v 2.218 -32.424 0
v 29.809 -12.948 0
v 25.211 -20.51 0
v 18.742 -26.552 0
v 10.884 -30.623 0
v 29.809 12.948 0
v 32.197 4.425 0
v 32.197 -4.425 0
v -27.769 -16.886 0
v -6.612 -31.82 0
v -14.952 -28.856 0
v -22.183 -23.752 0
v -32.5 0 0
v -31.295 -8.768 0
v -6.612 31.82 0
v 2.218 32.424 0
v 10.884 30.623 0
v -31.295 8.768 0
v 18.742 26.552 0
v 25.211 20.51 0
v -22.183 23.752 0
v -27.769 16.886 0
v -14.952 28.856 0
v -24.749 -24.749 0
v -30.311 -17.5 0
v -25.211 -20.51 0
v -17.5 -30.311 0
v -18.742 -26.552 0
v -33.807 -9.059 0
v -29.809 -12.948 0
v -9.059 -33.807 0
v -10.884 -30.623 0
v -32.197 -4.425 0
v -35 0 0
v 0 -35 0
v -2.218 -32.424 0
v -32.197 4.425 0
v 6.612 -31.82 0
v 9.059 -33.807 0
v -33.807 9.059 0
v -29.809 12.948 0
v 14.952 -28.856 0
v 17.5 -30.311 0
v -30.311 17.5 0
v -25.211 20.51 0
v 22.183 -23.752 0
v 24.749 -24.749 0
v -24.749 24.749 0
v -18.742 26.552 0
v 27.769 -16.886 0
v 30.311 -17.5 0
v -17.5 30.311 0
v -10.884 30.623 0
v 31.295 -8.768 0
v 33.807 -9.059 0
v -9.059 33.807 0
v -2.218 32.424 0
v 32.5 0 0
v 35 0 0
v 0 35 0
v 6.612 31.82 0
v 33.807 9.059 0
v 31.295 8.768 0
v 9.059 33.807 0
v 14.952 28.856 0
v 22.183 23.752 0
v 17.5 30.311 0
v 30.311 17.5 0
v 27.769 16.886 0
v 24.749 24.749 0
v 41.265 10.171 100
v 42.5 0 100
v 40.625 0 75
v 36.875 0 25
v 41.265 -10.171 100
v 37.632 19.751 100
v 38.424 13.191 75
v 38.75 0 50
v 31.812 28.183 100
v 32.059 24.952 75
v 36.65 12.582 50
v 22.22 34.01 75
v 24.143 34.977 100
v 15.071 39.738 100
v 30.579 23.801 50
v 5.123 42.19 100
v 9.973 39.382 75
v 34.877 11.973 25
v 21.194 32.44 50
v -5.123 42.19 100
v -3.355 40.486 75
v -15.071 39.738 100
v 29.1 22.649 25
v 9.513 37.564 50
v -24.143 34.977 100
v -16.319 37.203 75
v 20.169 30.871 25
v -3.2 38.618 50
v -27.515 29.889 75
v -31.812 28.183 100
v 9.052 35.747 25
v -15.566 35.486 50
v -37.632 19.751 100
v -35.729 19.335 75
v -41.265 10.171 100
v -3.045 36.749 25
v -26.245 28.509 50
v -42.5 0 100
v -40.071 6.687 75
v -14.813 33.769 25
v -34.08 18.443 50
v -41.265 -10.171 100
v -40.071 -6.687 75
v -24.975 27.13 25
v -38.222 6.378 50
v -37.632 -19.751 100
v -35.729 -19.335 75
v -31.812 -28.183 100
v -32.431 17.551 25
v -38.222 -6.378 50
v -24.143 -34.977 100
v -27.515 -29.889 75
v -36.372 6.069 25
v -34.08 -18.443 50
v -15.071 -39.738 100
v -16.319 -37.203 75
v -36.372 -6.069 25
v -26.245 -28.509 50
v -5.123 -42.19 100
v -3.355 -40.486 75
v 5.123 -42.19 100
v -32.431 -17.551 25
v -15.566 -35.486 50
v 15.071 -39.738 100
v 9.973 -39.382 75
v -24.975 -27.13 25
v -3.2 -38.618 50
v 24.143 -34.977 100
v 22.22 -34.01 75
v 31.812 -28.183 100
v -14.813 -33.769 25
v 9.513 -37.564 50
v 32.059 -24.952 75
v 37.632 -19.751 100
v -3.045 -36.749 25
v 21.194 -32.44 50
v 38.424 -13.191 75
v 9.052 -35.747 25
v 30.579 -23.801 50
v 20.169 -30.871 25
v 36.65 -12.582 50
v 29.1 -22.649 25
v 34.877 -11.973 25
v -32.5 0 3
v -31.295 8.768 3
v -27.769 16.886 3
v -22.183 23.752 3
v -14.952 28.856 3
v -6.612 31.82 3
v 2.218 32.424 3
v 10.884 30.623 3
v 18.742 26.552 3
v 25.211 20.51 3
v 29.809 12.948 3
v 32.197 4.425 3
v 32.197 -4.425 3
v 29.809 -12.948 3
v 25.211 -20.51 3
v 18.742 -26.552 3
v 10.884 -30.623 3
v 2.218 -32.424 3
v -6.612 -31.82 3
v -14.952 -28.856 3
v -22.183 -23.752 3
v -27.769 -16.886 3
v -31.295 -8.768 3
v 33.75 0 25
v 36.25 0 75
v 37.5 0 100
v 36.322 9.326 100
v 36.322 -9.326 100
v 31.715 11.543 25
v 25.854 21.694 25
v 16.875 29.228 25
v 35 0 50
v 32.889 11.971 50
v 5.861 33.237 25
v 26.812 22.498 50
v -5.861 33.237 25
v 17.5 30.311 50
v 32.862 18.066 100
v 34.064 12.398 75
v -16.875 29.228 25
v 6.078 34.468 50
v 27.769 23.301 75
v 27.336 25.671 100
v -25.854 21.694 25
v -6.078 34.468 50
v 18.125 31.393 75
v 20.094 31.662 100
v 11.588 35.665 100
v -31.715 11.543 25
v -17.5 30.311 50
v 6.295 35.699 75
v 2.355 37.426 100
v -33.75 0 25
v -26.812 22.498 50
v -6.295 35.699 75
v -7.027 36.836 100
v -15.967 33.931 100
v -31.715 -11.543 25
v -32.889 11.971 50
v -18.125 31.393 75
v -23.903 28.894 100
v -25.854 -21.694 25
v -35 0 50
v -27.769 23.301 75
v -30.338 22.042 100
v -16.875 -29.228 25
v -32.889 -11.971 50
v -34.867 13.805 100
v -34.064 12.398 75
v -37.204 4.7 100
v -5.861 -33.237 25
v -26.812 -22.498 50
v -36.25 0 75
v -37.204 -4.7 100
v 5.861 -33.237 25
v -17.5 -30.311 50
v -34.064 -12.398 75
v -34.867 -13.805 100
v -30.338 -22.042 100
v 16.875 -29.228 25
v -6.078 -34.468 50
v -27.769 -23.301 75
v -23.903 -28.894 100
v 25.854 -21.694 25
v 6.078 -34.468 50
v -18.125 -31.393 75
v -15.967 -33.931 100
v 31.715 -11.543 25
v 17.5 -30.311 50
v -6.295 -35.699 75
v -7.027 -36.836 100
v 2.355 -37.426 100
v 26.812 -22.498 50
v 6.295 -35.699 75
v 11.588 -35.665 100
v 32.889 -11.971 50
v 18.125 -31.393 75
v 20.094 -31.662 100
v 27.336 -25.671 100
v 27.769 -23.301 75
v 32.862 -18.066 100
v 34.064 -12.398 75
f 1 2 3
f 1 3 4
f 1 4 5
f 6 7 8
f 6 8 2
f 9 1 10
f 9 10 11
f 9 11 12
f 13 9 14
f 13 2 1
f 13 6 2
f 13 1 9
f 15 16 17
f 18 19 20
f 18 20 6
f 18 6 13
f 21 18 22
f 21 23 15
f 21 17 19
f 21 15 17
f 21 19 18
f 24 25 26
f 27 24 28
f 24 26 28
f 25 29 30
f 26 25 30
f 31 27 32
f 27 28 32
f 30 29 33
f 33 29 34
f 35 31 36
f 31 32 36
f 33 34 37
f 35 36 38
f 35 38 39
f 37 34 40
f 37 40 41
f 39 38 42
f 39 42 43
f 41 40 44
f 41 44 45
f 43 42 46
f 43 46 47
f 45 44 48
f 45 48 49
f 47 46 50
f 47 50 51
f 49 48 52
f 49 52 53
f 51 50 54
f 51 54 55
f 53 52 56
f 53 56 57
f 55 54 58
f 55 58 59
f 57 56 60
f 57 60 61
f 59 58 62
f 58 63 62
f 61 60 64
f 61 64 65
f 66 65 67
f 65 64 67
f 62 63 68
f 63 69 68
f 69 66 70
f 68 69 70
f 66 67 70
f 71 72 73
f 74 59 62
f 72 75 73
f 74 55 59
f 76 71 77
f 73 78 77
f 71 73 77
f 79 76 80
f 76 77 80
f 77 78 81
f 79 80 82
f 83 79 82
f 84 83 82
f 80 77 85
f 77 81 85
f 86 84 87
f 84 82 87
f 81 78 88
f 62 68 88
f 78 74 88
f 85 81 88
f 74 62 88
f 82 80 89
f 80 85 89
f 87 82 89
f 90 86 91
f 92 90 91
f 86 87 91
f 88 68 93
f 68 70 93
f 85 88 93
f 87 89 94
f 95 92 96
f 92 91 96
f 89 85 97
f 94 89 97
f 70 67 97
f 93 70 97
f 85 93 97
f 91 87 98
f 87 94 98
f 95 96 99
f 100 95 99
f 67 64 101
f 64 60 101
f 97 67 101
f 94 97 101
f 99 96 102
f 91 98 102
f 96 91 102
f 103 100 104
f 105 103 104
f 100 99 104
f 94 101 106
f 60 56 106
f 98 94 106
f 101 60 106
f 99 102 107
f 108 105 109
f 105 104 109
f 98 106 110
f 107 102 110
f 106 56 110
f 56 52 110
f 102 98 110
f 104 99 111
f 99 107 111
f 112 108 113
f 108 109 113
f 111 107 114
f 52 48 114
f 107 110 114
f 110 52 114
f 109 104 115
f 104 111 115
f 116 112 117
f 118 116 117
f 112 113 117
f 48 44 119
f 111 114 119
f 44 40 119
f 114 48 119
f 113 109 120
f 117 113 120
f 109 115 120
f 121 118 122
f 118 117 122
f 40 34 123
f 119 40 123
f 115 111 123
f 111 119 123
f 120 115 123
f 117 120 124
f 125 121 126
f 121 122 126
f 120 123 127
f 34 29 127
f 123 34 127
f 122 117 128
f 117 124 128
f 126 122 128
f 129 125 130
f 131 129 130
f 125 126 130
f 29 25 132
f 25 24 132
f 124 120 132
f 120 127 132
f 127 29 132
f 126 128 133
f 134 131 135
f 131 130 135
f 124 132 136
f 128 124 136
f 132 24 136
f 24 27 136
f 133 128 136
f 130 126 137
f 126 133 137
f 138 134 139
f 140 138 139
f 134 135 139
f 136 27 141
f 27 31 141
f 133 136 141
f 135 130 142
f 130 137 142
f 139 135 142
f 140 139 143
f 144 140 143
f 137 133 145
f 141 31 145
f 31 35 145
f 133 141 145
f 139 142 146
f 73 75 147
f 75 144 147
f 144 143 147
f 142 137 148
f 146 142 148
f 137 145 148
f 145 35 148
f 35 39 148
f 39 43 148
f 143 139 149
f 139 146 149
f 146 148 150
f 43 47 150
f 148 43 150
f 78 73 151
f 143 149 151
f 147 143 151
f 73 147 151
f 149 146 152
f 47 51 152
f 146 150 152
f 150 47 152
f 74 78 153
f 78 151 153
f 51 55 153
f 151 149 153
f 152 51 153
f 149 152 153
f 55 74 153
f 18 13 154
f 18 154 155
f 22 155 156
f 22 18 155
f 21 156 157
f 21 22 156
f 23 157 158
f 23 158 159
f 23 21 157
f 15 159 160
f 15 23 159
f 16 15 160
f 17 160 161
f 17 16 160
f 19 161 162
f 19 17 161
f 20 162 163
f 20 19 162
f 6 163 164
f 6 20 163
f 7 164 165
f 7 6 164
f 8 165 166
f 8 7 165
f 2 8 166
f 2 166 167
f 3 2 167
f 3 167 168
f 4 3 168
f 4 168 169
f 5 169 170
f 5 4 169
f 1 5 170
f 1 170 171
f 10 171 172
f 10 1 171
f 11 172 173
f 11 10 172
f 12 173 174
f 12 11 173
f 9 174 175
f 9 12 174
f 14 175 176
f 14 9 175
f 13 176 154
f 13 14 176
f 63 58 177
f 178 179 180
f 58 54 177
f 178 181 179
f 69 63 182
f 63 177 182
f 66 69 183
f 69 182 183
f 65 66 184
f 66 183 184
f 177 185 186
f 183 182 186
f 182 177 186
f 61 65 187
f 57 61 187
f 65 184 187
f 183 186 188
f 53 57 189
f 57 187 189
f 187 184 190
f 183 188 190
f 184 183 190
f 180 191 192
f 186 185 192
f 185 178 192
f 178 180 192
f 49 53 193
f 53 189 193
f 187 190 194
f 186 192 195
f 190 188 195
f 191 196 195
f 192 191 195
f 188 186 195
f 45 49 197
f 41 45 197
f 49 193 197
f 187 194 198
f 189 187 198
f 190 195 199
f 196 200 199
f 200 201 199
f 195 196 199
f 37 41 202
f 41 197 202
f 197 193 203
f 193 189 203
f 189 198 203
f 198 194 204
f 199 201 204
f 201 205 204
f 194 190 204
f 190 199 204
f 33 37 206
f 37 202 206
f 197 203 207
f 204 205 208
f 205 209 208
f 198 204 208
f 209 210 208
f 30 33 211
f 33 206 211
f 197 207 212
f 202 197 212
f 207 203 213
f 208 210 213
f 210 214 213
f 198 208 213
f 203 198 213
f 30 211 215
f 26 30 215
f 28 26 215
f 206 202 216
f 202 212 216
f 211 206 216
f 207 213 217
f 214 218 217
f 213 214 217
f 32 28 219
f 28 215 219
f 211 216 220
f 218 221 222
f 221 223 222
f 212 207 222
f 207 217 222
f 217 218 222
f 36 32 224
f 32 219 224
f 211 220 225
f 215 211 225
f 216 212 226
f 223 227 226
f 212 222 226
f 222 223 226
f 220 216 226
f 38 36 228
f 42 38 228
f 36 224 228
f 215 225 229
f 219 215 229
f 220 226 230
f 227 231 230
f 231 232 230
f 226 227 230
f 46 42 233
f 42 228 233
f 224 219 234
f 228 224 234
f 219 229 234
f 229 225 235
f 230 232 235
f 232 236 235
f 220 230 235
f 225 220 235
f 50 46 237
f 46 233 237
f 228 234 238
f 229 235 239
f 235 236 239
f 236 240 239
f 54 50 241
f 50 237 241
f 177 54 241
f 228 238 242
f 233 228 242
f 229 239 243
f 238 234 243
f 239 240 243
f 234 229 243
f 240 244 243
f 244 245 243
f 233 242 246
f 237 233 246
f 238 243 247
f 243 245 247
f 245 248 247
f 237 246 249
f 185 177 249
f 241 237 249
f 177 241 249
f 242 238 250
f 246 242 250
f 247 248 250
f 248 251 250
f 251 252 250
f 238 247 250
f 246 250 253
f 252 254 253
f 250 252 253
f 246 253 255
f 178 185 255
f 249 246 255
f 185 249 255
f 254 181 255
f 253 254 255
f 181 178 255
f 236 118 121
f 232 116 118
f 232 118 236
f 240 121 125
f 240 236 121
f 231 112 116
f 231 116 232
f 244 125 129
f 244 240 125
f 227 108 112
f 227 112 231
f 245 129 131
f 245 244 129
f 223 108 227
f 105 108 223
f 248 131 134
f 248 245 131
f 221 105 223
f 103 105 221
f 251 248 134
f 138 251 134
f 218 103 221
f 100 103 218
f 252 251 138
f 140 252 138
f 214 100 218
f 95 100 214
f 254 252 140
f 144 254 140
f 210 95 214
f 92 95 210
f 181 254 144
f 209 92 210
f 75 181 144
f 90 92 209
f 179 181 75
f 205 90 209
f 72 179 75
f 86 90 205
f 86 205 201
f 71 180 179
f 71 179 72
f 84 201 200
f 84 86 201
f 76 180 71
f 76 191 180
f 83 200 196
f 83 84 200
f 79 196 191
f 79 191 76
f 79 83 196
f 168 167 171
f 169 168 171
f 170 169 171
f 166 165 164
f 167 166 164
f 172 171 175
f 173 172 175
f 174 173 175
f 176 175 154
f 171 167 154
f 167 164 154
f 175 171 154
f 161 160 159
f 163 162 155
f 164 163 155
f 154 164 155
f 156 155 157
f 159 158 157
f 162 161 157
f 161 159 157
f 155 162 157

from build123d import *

# Parameters (mm, degrees)
SKETCH7_R           = 42.5
SKETCH6_R           = 35
SKETCH9_R           = 32.5
BOSS_EXTRUDE3_DEPTH = 3


# Read off the part's stored shape, not the designer's step: Cut-Loft2
with BuildPart() as part:
    # Sketch7 → Loft1 section 0
    with BuildSketch(Plane.XY.offset(100)):
        Circle(SKETCH7_R)
    # Sketch6 → Loft1 section 1
    with BuildSketch(Plane.XY):
        Circle(SKETCH6_R)
    loft()

    # Cut-Loft2 outline → Cut-Loft2 (revolve, cut)
    with BuildSketch(Plane.XZ):
        Polygon((0, 100), (0, 0), (32.5, 0), (37.5, 100), align=None)
    revolve(axis=Axis((0, 0, 0), (0, 0, 1)), mode=Mode.SUBTRACT)


with BuildPart() as body_2:
    # Sketch9 → Boss-Extrude3 (new body)
    with BuildSketch(Plane(origin=(0, 0, 0), x_dir=(-1, 0, 0), z_dir=(0, 0, -1))):
        Circle(SKETCH9_R)
    extrude(amount=-BOSS_EXTRUDE3_DEPTH)


solid = Compound([part.part, body_2.part])
